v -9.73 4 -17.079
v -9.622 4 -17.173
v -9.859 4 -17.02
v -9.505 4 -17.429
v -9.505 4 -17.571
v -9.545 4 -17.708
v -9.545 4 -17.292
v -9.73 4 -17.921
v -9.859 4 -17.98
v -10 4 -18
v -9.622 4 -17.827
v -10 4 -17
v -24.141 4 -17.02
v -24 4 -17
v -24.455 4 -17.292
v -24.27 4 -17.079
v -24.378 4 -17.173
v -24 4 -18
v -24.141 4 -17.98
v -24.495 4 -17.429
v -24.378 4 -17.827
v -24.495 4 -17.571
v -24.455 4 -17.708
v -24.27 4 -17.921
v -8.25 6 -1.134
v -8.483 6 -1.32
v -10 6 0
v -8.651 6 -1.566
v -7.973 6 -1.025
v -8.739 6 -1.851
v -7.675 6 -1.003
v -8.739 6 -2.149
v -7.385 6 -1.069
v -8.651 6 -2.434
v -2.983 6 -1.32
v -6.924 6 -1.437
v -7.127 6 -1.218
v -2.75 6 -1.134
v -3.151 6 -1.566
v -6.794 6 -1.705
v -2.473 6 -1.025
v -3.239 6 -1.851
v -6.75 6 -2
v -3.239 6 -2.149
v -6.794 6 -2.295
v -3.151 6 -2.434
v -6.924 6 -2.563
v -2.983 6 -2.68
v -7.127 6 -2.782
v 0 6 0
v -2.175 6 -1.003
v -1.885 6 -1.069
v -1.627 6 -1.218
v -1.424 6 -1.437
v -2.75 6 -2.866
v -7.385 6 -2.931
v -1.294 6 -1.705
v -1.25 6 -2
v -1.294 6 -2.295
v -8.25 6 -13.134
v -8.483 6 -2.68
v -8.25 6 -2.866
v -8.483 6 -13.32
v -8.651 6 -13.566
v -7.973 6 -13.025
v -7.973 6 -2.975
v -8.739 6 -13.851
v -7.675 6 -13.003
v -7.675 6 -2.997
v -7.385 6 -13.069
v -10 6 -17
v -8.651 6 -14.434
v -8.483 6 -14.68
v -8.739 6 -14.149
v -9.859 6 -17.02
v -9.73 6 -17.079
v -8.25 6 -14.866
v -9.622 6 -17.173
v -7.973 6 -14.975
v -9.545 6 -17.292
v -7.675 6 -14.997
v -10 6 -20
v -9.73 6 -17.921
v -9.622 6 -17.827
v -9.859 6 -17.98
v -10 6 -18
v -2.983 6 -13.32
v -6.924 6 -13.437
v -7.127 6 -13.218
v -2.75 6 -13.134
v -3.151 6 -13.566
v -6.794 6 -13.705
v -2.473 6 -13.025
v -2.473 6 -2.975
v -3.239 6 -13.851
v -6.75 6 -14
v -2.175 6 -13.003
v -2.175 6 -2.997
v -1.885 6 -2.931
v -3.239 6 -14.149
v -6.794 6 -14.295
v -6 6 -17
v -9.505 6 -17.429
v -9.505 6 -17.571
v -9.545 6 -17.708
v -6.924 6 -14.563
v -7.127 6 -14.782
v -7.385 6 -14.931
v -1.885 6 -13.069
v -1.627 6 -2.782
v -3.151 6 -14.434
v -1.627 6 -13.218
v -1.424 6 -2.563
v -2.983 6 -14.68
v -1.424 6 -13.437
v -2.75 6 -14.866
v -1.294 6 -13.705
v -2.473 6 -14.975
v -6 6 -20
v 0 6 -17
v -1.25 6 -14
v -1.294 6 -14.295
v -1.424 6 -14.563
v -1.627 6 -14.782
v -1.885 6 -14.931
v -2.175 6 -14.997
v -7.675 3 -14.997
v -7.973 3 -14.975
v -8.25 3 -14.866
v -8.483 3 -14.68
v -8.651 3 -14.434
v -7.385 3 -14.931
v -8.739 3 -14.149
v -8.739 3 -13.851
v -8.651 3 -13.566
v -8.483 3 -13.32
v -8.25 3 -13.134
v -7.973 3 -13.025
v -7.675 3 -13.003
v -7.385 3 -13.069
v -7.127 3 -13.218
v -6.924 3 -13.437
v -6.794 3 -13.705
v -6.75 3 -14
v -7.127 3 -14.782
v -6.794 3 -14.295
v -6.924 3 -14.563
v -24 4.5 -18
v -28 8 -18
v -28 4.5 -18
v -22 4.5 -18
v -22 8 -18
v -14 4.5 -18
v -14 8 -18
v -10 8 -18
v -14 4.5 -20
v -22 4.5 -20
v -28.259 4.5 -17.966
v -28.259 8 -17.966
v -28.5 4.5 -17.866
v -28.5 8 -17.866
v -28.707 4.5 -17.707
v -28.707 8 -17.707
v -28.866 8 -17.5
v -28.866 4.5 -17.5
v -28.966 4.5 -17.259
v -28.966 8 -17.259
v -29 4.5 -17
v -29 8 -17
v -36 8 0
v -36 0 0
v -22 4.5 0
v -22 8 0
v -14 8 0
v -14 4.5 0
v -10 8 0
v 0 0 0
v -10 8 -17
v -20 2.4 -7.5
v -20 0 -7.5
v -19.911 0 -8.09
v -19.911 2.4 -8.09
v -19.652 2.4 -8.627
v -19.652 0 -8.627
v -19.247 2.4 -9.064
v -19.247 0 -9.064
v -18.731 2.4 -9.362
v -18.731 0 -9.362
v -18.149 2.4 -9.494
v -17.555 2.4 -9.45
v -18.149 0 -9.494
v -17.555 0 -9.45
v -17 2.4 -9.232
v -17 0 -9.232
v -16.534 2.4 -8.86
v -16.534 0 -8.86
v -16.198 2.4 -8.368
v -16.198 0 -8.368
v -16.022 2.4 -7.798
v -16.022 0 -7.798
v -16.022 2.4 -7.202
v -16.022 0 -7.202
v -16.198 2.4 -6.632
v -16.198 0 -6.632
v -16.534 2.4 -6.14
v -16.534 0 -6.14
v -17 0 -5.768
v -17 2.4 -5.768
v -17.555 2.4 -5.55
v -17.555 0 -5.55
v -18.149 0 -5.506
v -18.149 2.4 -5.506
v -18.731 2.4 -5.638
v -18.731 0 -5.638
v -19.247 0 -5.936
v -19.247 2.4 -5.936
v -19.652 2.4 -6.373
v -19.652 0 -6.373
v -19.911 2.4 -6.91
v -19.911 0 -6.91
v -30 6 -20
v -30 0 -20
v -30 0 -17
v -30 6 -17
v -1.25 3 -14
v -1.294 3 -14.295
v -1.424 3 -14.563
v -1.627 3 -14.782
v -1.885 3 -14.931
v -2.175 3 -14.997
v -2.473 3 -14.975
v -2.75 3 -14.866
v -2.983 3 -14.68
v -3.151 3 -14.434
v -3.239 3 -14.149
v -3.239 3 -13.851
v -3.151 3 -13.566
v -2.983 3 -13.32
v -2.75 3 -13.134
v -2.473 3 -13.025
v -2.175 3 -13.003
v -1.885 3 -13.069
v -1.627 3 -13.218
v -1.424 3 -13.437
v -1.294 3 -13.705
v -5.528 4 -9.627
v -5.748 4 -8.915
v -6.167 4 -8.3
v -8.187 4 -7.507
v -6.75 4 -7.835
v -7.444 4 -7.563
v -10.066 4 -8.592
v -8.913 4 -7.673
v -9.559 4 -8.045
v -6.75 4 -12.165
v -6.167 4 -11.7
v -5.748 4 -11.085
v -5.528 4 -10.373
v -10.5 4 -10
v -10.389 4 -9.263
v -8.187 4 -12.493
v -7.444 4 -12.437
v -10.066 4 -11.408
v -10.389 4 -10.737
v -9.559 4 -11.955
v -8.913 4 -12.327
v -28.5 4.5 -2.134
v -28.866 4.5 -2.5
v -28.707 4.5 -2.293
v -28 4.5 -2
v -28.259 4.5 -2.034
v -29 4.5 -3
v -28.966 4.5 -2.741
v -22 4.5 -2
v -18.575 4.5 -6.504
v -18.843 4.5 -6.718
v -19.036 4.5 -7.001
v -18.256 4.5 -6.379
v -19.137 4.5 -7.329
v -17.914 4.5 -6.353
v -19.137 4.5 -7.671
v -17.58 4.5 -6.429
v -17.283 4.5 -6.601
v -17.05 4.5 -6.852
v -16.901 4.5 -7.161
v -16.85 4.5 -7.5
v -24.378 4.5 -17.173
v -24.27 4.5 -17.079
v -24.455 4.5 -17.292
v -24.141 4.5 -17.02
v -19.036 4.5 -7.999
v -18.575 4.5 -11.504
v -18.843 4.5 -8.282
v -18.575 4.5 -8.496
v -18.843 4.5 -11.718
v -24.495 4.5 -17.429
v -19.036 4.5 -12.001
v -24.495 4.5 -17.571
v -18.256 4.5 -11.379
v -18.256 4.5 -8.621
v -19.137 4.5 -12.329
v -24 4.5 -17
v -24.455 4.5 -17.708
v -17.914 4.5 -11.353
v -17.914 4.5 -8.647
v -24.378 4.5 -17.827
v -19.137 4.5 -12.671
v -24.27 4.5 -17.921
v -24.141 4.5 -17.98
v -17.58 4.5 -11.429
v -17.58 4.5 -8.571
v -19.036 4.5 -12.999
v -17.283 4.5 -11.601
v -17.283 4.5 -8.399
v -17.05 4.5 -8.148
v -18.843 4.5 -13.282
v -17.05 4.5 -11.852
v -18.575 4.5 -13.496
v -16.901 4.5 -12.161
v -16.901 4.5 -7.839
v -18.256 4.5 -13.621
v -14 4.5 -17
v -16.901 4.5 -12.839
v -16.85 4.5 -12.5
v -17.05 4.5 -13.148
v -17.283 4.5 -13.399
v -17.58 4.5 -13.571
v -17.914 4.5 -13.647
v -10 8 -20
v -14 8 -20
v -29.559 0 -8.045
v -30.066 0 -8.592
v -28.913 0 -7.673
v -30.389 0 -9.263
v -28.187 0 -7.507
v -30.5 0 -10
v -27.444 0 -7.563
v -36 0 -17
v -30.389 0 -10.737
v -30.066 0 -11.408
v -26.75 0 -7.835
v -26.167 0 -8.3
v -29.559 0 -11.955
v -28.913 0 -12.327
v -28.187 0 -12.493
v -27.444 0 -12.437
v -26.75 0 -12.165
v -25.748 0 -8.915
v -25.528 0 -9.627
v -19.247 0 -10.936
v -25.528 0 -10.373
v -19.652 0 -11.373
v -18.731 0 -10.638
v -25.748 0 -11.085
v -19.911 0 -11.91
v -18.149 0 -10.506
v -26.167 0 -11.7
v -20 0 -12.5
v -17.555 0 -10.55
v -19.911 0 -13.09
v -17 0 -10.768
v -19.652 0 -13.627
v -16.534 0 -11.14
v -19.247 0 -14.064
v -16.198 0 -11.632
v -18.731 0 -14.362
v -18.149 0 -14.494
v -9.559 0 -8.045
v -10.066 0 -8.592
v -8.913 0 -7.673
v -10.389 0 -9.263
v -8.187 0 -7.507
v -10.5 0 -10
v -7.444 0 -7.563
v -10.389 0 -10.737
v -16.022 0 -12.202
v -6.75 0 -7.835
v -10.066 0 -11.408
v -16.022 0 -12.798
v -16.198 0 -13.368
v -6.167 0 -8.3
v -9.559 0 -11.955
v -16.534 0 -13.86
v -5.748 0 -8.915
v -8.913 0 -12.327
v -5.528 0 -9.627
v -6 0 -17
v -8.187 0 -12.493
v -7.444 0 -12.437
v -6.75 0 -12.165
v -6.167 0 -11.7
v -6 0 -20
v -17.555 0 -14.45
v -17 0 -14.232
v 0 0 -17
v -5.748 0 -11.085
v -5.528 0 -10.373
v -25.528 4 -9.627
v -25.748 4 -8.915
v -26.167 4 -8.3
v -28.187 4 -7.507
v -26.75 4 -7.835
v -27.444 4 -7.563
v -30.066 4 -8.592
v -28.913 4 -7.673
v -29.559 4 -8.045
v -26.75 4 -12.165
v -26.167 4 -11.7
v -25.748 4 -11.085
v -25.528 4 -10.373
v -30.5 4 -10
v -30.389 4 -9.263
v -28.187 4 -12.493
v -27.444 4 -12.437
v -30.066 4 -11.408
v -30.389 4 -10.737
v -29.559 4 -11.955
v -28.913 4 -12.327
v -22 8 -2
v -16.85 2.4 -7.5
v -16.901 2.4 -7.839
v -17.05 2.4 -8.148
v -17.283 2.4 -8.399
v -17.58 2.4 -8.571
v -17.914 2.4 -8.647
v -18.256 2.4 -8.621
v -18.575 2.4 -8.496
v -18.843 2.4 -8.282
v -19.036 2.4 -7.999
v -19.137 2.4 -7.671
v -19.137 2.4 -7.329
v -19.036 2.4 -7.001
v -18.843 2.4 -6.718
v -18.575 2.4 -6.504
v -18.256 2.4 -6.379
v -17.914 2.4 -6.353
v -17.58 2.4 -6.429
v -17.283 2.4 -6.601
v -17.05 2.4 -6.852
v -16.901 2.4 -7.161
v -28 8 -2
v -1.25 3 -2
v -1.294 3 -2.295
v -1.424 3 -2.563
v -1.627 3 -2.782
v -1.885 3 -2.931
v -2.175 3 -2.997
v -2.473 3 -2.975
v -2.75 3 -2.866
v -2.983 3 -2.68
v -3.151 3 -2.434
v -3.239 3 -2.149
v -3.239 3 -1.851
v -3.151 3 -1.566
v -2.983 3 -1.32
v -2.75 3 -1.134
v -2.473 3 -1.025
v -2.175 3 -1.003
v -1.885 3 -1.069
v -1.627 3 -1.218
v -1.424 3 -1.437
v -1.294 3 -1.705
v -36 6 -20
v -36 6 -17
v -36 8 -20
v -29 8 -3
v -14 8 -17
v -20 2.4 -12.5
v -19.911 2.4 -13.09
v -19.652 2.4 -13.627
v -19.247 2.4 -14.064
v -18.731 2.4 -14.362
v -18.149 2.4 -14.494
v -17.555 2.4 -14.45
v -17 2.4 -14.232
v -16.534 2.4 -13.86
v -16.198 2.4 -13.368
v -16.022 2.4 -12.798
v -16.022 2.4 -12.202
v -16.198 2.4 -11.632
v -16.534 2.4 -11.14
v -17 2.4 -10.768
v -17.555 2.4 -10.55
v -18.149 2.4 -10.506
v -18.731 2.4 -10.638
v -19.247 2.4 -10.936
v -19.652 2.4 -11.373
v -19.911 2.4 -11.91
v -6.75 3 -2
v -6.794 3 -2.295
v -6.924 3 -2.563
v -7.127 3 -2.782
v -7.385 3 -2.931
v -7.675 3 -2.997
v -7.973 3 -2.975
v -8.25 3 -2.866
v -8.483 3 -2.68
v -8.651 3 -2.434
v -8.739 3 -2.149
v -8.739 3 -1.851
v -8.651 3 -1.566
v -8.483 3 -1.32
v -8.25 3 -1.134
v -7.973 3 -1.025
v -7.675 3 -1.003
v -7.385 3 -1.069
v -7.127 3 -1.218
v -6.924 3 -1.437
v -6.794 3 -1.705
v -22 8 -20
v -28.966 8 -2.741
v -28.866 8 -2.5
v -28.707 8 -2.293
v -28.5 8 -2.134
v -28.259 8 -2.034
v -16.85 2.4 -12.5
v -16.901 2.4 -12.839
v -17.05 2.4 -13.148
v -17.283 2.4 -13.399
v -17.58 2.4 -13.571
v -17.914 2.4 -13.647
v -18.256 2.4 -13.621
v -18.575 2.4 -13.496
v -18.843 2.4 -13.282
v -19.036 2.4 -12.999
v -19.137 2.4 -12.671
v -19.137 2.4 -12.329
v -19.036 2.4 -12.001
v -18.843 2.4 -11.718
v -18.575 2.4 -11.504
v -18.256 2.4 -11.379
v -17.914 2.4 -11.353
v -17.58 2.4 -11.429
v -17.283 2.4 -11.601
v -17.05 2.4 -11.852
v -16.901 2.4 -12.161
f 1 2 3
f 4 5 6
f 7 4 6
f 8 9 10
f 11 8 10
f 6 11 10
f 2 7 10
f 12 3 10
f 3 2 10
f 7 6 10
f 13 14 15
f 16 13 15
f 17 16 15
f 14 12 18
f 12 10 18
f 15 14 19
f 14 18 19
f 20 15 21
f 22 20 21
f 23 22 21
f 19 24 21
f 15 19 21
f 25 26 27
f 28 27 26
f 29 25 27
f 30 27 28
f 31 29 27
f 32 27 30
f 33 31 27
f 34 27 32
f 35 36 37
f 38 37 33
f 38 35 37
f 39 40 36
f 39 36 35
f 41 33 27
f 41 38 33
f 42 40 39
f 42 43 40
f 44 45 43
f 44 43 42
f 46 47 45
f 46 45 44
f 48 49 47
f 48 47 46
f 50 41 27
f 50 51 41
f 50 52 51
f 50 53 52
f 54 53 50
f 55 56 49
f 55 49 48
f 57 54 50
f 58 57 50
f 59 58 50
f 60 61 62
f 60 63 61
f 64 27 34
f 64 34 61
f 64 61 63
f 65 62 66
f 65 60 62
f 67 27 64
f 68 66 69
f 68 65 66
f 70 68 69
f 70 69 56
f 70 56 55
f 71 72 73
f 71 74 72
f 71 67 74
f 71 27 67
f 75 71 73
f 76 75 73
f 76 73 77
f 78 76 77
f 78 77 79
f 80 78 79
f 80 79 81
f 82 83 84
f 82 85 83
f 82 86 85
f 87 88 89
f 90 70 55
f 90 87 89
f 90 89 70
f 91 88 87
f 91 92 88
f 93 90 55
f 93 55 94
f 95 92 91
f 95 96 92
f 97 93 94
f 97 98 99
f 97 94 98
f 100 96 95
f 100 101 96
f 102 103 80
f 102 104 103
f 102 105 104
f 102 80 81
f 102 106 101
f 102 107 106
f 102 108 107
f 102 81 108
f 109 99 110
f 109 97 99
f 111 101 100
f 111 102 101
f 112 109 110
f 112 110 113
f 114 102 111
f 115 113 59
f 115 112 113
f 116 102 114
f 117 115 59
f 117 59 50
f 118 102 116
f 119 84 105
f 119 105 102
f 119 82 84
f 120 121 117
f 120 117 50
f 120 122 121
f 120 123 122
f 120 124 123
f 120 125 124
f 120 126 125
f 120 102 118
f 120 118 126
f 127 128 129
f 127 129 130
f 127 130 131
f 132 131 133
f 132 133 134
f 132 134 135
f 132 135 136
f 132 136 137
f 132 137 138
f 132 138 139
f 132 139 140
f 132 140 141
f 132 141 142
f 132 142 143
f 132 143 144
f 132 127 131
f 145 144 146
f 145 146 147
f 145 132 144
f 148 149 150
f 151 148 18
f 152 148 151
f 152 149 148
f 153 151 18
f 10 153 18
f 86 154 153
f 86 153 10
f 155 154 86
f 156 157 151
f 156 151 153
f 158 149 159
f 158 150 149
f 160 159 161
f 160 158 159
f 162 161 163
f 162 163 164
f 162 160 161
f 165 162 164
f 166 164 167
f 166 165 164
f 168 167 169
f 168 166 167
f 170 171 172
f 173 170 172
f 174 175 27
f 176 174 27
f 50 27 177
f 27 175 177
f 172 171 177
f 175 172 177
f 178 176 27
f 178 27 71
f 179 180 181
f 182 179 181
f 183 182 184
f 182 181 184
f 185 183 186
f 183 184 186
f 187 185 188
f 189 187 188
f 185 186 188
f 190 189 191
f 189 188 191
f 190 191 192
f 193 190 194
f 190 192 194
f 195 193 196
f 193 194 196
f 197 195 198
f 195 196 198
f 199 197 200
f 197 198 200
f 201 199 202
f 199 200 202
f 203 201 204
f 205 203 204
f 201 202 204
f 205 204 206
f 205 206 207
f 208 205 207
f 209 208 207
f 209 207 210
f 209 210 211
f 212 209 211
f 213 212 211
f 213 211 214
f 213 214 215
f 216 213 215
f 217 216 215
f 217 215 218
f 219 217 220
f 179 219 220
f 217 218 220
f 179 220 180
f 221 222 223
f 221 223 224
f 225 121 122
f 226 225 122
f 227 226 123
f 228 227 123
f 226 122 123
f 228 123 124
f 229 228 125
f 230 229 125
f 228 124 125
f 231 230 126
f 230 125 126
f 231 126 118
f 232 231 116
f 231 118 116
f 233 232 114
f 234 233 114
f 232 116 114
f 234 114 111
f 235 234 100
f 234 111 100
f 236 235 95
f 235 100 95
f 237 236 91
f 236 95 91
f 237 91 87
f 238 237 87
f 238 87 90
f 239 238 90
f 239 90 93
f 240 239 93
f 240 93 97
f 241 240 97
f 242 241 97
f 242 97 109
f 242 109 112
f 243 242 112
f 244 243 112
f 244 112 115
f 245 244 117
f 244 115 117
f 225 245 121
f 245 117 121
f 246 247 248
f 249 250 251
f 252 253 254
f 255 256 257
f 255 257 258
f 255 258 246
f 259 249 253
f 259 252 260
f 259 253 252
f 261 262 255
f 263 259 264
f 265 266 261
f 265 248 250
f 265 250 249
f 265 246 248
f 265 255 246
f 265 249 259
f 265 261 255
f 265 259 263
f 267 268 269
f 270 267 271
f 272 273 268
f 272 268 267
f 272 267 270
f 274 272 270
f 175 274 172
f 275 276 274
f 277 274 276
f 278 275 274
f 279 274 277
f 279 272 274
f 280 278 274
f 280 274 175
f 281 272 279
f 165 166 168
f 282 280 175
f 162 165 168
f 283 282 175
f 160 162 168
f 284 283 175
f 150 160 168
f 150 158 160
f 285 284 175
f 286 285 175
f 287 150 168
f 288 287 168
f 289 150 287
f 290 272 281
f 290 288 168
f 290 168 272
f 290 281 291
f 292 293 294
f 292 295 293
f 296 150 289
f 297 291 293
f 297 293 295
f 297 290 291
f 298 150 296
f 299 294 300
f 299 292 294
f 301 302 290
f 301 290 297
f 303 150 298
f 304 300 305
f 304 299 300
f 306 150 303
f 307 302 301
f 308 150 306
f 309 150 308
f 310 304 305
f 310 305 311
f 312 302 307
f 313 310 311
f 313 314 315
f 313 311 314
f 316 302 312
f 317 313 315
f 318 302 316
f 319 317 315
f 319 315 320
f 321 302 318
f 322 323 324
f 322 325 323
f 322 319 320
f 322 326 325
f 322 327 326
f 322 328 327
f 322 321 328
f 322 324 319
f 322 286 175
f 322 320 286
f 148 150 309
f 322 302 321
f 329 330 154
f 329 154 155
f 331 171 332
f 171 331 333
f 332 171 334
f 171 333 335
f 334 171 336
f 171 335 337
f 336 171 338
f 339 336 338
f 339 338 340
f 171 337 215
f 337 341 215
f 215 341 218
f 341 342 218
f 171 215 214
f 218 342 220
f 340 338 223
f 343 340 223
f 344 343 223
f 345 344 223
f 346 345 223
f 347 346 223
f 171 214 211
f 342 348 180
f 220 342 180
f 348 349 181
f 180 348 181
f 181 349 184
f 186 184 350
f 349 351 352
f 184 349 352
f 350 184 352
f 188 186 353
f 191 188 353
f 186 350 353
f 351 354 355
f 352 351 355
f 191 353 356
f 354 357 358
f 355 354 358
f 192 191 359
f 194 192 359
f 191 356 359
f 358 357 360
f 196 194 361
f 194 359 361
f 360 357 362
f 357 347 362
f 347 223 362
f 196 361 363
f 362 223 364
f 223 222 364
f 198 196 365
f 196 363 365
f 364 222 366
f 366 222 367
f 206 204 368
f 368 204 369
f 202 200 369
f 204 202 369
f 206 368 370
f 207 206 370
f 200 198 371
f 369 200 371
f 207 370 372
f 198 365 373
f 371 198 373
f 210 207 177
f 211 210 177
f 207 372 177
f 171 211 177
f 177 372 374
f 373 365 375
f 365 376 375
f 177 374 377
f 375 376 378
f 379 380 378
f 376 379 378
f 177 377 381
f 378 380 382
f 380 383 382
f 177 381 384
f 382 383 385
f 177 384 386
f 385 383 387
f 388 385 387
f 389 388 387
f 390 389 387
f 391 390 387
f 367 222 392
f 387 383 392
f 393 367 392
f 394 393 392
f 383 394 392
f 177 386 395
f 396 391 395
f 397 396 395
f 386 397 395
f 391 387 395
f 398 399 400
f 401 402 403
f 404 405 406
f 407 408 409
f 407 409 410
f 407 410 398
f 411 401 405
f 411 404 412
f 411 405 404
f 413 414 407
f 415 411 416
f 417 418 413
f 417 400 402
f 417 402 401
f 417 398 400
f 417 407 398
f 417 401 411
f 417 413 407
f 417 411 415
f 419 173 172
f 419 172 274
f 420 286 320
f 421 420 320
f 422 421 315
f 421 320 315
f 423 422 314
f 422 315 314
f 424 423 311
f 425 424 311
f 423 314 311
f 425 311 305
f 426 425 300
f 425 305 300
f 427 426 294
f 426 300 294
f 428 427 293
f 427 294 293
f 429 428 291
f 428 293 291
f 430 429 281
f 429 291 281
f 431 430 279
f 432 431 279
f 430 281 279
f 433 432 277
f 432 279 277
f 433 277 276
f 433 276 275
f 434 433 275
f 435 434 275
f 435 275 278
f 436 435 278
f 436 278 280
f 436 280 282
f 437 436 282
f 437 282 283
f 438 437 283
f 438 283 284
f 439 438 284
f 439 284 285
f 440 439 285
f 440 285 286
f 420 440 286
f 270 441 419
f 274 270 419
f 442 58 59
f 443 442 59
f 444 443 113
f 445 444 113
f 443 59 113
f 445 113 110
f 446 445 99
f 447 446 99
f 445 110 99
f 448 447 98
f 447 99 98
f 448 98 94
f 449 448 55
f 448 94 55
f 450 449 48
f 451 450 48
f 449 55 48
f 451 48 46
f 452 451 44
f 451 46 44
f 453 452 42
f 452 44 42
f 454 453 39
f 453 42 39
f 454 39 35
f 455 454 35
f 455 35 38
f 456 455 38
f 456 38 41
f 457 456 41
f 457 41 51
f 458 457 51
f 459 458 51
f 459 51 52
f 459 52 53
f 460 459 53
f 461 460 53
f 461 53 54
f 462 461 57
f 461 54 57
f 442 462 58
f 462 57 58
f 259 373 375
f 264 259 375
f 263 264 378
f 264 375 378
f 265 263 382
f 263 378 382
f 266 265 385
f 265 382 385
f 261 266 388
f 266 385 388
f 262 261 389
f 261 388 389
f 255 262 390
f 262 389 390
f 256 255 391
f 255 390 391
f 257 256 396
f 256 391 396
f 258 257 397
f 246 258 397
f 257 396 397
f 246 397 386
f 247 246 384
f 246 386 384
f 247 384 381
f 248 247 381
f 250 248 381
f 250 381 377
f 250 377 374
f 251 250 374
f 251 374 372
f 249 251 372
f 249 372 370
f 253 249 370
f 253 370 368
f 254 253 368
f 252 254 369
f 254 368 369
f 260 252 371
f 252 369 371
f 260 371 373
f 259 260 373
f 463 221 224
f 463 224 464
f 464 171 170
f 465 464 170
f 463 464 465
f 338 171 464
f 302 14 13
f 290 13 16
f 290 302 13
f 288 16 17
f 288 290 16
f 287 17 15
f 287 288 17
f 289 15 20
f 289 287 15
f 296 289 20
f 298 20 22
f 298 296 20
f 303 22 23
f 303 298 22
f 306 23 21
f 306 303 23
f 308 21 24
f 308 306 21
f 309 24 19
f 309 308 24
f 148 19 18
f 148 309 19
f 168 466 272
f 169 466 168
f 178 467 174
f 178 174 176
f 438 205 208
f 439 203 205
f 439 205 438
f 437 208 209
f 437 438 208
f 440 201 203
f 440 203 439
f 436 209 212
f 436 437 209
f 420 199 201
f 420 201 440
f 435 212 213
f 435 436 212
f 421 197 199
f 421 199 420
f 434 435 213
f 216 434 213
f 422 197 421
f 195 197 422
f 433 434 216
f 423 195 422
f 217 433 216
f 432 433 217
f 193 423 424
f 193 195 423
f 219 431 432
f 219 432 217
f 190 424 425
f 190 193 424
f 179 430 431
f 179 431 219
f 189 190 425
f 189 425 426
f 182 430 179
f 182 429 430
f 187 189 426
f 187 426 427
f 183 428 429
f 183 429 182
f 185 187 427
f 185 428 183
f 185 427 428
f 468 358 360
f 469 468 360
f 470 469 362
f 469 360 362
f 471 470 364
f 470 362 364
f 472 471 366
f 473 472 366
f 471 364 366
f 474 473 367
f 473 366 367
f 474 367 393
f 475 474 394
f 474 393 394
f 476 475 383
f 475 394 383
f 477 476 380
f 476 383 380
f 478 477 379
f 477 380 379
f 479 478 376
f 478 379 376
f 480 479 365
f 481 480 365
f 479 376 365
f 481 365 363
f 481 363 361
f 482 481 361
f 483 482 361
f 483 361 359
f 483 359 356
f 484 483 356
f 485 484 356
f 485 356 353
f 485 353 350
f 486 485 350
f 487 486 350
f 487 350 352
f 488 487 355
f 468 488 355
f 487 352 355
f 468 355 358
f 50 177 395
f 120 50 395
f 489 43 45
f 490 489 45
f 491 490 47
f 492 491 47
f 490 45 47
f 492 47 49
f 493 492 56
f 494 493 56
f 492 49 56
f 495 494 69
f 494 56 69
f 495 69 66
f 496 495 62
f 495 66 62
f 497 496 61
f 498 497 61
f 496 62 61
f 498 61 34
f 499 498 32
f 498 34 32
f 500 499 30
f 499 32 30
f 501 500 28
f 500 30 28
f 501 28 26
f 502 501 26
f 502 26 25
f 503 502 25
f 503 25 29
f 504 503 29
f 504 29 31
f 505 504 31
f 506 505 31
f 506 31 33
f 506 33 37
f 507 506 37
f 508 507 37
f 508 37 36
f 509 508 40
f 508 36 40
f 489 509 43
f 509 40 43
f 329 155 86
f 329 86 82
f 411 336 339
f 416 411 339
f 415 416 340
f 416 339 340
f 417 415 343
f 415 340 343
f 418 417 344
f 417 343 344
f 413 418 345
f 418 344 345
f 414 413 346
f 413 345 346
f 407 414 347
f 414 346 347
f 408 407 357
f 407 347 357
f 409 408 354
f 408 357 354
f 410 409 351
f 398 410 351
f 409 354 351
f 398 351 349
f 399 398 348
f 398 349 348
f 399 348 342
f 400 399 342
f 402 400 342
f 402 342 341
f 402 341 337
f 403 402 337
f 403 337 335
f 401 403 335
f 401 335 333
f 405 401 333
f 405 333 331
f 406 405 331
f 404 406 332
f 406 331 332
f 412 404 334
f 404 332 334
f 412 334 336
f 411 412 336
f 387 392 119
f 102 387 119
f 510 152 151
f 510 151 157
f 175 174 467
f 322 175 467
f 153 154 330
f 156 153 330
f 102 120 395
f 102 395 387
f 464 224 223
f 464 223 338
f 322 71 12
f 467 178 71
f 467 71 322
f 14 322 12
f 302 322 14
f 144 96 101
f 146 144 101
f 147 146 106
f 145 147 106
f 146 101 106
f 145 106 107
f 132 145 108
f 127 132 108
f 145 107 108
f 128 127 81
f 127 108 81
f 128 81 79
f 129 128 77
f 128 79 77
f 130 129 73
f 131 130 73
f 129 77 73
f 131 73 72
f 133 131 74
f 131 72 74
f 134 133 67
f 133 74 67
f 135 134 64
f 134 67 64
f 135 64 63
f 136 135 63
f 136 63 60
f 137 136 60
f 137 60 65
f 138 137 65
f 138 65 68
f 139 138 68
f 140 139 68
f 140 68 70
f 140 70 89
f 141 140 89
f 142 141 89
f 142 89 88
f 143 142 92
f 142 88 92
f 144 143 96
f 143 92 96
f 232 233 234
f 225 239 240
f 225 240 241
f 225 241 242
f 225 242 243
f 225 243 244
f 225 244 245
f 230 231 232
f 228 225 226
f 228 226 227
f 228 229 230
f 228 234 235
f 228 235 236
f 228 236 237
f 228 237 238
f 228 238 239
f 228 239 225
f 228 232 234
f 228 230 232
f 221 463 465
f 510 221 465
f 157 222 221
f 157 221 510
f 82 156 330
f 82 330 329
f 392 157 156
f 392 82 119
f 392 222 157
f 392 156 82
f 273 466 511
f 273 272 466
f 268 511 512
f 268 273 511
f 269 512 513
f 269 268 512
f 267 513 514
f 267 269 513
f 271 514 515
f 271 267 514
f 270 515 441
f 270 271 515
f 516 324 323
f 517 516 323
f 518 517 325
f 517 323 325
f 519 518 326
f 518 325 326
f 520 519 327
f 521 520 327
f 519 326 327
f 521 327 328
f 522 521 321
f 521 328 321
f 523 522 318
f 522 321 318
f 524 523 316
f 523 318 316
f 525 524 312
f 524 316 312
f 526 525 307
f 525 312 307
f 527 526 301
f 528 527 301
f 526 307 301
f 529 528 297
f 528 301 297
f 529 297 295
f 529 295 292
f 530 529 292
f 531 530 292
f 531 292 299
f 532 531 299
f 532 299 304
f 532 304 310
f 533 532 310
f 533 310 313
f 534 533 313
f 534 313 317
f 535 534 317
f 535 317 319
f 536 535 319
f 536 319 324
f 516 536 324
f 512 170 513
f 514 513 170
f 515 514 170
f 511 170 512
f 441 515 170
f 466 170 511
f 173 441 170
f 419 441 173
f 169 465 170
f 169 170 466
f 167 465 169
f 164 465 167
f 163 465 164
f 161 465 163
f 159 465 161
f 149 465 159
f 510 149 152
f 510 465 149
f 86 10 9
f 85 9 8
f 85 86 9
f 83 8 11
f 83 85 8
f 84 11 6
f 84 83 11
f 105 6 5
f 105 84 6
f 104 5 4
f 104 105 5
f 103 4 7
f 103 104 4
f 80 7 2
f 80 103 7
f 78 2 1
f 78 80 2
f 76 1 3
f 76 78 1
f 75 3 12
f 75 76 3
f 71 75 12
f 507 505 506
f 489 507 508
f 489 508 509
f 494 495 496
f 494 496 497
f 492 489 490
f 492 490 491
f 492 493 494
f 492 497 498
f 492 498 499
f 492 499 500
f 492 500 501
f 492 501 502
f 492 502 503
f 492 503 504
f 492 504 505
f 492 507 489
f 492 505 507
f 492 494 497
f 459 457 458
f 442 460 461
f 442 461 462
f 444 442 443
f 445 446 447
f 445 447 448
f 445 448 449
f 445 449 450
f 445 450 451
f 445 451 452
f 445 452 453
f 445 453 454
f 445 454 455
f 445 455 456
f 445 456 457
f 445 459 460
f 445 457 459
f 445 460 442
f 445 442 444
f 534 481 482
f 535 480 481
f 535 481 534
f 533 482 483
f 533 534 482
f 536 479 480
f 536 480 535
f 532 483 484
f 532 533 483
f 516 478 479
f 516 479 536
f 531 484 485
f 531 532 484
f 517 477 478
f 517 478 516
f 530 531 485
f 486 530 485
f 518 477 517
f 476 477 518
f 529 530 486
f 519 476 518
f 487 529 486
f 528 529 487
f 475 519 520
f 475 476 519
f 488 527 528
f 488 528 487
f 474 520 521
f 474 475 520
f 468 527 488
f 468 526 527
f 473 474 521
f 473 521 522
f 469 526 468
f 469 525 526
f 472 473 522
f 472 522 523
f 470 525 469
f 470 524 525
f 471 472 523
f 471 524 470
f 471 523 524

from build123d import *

# Parameters (mm, degrees)
SKETCH_1_W           = 36
SKETCH_1_H           = 20
EXTRUDE_1_DEPTH      = 8
SKETCH_2_W           = 8
SKETCH_2_H           = 20
CUT_EXTRUDE_1_DEPTH  = 3.5
SKETCH_3_R           = 2.5
CUT_EXTRUDE_2_DEPTH  = 4
SKETCH_5_W           = 7
SKETCH_5_H           = 16
CUT_EXTRUDE_4_DEPTH  = 3.5
FILLET_1_R           = 1
SKETCH_6_R           = 1.15
CUT_EXTRUDE_5_DEPTH  = 5.5
SKETCH_7_W           = 10
SKETCH_7_H           = 20
CUT_EXTRUDE_6_DEPTH  = 2
CUT_EXTRUDE_7_DEPTH  = 4
SKETCH_9_R           = 1
CUT_EXTRUDE_10_DEPTH = 3
SKETCH_10_R          = 2
CUT_EXTRUDE_11_DEPTH = 2.4
SKETCH_11_W          = 6
SKETCH_11_H          = 6
CUT_EXTRUDE_15_DEPTH = 3


with BuildPart() as part:
    # 草图1 → 凸台-拉伸1 (new body)
    with BuildSketch(Plane(origin=(0, 0, 0), x_dir=(1, 0, 0), z_dir=(0, 1, 0))):
        with Locations((-18, 10)):
            Rectangle(SKETCH_1_W, SKETCH_1_H)
    extrude(amount=EXTRUDE_1_DEPTH)

    # 草图2 → 切除-拉伸1 (cut)
    with BuildSketch(Plane(origin=(0, 8, 0), x_dir=(1, 0, 0), z_dir=(0, 1, 0))):
        with Locations((-18, 10)):
            Rectangle(SKETCH_2_W, SKETCH_2_H)
    extrude(amount=-CUT_EXTRUDE_1_DEPTH, mode=Mode.SUBTRACT)

    # 草图3 → 切除-拉伸2 (cut)
    with BuildSketch(Plane(origin=(0, 0, 0), x_dir=(-1, 0, 0), z_dir=(0, -1, 0))):
        with Locations((8, 10)):
            Circle(SKETCH_3_R)
        with Locations((28, 10)):
            Circle(SKETCH_3_R)
    extrude(amount=-CUT_EXTRUDE_2_DEPTH, mode=Mode.SUBTRACT)

    # 草图5 → 切除-拉伸4 (cut)
    with BuildSketch(Plane(origin=(0, 8, 0), x_dir=(1, 0, 0), z_dir=(0, 1, 0))):
        with Locations((-25.5, 10)):
            Rectangle(SKETCH_5_W, SKETCH_5_H)
    extrude(amount=-CUT_EXTRUDE_4_DEPTH, mode=Mode.SUBTRACT)

    # 圆角1
    fillet_1_edges = [part.edges().sort_by_distance(p)[0] for p in [
        (-29, 6.25, -2),
        (-29, 6.25, -18),
    ]]
    fillet(fillet_1_edges, radius=FILLET_1_R)

    # 草图6 → 切除-拉伸5 (cut, through all)
    with BuildSketch(Plane(origin=(0, 4.5, 0), x_dir=(1, 0, 0), z_dir=(0, 1, 0))):
        with Locations((-18, 12.5)):
            Circle(SKETCH_6_R)
        with Locations((-18, 7.5)):
            Circle(SKETCH_6_R)
    extrude(amount=-CUT_EXTRUDE_5_DEPTH, mode=Mode.SUBTRACT)

    # 草图7 → 切除-拉伸6 (cut)
    with BuildSketch(Plane(origin=(0, 8, 0), x_dir=(1, 0, 0), z_dir=(0, 1, 0))):
        with Locations((-5, 10)):
            Rectangle(SKETCH_7_W, SKETCH_7_H)
    extrude(amount=-CUT_EXTRUDE_6_DEPTH, mode=Mode.SUBTRACT)

    # 草图8 → 切除-拉伸7 (cut)
    with BuildSketch(Plane(origin=(0, 8, 0), x_dir=(1, 0, 0), z_dir=(0, 1, 0))):
        with BuildLine():
            Line((-24, 18), (-10, 18))
            ThreePointArc((-10, 18), (-9.5, 17.5), (-10, 17))
            Line((-10, 17), (-24, 17))
            ThreePointArc((-24, 17), (-24.5, 17.5), (-24, 18))
        make_face()
    extrude(amount=-CUT_EXTRUDE_7_DEPTH, mode=Mode.SUBTRACT)

    # 草图9 → 切除-拉伸10 (cut)
    with BuildSketch(Plane(origin=(0, 6, 0), x_dir=(1, 0, 0), z_dir=(0, 1, 0))):
        with Locations((-2.25, 2)):
            Circle(SKETCH_9_R)
        with Locations((-7.75, 2)):
            Circle(SKETCH_9_R)
        with Locations((-2.25, 14)):
            Circle(SKETCH_9_R)
        with Locations((-7.75, 14)):
            Circle(SKETCH_9_R)
    extrude(amount=-CUT_EXTRUDE_10_DEPTH, mode=Mode.SUBTRACT)

    # 草图10 → 切除-拉伸11 (cut)
    with BuildSketch(Plane(origin=(0, 0, 0), x_dir=(-1, 0, 0), z_dir=(0, -1, 0))):
        with Locations((18, 12.5)):
            Circle(SKETCH_10_R)
        with Locations((18, 7.5)):
            Circle(SKETCH_10_R)
    extrude(amount=-CUT_EXTRUDE_11_DEPTH, mode=Mode.SUBTRACT)

    # 草图11 → 切除-拉伸15 (cut)
    with BuildSketch(Plane(origin=(0, 0, -20), x_dir=(-1, 0, 0), z_dir=(0, 0, -1))):
        with Locations((3, 3)):
            Rectangle(SKETCH_11_W, SKETCH_11_H)
        with Locations((33, 3)):
            Rectangle(SKETCH_11_W, SKETCH_11_H)
    extrude(amount=-CUT_EXTRUDE_15_DEPTH, mode=Mode.SUBTRACT)


solid = part.part
